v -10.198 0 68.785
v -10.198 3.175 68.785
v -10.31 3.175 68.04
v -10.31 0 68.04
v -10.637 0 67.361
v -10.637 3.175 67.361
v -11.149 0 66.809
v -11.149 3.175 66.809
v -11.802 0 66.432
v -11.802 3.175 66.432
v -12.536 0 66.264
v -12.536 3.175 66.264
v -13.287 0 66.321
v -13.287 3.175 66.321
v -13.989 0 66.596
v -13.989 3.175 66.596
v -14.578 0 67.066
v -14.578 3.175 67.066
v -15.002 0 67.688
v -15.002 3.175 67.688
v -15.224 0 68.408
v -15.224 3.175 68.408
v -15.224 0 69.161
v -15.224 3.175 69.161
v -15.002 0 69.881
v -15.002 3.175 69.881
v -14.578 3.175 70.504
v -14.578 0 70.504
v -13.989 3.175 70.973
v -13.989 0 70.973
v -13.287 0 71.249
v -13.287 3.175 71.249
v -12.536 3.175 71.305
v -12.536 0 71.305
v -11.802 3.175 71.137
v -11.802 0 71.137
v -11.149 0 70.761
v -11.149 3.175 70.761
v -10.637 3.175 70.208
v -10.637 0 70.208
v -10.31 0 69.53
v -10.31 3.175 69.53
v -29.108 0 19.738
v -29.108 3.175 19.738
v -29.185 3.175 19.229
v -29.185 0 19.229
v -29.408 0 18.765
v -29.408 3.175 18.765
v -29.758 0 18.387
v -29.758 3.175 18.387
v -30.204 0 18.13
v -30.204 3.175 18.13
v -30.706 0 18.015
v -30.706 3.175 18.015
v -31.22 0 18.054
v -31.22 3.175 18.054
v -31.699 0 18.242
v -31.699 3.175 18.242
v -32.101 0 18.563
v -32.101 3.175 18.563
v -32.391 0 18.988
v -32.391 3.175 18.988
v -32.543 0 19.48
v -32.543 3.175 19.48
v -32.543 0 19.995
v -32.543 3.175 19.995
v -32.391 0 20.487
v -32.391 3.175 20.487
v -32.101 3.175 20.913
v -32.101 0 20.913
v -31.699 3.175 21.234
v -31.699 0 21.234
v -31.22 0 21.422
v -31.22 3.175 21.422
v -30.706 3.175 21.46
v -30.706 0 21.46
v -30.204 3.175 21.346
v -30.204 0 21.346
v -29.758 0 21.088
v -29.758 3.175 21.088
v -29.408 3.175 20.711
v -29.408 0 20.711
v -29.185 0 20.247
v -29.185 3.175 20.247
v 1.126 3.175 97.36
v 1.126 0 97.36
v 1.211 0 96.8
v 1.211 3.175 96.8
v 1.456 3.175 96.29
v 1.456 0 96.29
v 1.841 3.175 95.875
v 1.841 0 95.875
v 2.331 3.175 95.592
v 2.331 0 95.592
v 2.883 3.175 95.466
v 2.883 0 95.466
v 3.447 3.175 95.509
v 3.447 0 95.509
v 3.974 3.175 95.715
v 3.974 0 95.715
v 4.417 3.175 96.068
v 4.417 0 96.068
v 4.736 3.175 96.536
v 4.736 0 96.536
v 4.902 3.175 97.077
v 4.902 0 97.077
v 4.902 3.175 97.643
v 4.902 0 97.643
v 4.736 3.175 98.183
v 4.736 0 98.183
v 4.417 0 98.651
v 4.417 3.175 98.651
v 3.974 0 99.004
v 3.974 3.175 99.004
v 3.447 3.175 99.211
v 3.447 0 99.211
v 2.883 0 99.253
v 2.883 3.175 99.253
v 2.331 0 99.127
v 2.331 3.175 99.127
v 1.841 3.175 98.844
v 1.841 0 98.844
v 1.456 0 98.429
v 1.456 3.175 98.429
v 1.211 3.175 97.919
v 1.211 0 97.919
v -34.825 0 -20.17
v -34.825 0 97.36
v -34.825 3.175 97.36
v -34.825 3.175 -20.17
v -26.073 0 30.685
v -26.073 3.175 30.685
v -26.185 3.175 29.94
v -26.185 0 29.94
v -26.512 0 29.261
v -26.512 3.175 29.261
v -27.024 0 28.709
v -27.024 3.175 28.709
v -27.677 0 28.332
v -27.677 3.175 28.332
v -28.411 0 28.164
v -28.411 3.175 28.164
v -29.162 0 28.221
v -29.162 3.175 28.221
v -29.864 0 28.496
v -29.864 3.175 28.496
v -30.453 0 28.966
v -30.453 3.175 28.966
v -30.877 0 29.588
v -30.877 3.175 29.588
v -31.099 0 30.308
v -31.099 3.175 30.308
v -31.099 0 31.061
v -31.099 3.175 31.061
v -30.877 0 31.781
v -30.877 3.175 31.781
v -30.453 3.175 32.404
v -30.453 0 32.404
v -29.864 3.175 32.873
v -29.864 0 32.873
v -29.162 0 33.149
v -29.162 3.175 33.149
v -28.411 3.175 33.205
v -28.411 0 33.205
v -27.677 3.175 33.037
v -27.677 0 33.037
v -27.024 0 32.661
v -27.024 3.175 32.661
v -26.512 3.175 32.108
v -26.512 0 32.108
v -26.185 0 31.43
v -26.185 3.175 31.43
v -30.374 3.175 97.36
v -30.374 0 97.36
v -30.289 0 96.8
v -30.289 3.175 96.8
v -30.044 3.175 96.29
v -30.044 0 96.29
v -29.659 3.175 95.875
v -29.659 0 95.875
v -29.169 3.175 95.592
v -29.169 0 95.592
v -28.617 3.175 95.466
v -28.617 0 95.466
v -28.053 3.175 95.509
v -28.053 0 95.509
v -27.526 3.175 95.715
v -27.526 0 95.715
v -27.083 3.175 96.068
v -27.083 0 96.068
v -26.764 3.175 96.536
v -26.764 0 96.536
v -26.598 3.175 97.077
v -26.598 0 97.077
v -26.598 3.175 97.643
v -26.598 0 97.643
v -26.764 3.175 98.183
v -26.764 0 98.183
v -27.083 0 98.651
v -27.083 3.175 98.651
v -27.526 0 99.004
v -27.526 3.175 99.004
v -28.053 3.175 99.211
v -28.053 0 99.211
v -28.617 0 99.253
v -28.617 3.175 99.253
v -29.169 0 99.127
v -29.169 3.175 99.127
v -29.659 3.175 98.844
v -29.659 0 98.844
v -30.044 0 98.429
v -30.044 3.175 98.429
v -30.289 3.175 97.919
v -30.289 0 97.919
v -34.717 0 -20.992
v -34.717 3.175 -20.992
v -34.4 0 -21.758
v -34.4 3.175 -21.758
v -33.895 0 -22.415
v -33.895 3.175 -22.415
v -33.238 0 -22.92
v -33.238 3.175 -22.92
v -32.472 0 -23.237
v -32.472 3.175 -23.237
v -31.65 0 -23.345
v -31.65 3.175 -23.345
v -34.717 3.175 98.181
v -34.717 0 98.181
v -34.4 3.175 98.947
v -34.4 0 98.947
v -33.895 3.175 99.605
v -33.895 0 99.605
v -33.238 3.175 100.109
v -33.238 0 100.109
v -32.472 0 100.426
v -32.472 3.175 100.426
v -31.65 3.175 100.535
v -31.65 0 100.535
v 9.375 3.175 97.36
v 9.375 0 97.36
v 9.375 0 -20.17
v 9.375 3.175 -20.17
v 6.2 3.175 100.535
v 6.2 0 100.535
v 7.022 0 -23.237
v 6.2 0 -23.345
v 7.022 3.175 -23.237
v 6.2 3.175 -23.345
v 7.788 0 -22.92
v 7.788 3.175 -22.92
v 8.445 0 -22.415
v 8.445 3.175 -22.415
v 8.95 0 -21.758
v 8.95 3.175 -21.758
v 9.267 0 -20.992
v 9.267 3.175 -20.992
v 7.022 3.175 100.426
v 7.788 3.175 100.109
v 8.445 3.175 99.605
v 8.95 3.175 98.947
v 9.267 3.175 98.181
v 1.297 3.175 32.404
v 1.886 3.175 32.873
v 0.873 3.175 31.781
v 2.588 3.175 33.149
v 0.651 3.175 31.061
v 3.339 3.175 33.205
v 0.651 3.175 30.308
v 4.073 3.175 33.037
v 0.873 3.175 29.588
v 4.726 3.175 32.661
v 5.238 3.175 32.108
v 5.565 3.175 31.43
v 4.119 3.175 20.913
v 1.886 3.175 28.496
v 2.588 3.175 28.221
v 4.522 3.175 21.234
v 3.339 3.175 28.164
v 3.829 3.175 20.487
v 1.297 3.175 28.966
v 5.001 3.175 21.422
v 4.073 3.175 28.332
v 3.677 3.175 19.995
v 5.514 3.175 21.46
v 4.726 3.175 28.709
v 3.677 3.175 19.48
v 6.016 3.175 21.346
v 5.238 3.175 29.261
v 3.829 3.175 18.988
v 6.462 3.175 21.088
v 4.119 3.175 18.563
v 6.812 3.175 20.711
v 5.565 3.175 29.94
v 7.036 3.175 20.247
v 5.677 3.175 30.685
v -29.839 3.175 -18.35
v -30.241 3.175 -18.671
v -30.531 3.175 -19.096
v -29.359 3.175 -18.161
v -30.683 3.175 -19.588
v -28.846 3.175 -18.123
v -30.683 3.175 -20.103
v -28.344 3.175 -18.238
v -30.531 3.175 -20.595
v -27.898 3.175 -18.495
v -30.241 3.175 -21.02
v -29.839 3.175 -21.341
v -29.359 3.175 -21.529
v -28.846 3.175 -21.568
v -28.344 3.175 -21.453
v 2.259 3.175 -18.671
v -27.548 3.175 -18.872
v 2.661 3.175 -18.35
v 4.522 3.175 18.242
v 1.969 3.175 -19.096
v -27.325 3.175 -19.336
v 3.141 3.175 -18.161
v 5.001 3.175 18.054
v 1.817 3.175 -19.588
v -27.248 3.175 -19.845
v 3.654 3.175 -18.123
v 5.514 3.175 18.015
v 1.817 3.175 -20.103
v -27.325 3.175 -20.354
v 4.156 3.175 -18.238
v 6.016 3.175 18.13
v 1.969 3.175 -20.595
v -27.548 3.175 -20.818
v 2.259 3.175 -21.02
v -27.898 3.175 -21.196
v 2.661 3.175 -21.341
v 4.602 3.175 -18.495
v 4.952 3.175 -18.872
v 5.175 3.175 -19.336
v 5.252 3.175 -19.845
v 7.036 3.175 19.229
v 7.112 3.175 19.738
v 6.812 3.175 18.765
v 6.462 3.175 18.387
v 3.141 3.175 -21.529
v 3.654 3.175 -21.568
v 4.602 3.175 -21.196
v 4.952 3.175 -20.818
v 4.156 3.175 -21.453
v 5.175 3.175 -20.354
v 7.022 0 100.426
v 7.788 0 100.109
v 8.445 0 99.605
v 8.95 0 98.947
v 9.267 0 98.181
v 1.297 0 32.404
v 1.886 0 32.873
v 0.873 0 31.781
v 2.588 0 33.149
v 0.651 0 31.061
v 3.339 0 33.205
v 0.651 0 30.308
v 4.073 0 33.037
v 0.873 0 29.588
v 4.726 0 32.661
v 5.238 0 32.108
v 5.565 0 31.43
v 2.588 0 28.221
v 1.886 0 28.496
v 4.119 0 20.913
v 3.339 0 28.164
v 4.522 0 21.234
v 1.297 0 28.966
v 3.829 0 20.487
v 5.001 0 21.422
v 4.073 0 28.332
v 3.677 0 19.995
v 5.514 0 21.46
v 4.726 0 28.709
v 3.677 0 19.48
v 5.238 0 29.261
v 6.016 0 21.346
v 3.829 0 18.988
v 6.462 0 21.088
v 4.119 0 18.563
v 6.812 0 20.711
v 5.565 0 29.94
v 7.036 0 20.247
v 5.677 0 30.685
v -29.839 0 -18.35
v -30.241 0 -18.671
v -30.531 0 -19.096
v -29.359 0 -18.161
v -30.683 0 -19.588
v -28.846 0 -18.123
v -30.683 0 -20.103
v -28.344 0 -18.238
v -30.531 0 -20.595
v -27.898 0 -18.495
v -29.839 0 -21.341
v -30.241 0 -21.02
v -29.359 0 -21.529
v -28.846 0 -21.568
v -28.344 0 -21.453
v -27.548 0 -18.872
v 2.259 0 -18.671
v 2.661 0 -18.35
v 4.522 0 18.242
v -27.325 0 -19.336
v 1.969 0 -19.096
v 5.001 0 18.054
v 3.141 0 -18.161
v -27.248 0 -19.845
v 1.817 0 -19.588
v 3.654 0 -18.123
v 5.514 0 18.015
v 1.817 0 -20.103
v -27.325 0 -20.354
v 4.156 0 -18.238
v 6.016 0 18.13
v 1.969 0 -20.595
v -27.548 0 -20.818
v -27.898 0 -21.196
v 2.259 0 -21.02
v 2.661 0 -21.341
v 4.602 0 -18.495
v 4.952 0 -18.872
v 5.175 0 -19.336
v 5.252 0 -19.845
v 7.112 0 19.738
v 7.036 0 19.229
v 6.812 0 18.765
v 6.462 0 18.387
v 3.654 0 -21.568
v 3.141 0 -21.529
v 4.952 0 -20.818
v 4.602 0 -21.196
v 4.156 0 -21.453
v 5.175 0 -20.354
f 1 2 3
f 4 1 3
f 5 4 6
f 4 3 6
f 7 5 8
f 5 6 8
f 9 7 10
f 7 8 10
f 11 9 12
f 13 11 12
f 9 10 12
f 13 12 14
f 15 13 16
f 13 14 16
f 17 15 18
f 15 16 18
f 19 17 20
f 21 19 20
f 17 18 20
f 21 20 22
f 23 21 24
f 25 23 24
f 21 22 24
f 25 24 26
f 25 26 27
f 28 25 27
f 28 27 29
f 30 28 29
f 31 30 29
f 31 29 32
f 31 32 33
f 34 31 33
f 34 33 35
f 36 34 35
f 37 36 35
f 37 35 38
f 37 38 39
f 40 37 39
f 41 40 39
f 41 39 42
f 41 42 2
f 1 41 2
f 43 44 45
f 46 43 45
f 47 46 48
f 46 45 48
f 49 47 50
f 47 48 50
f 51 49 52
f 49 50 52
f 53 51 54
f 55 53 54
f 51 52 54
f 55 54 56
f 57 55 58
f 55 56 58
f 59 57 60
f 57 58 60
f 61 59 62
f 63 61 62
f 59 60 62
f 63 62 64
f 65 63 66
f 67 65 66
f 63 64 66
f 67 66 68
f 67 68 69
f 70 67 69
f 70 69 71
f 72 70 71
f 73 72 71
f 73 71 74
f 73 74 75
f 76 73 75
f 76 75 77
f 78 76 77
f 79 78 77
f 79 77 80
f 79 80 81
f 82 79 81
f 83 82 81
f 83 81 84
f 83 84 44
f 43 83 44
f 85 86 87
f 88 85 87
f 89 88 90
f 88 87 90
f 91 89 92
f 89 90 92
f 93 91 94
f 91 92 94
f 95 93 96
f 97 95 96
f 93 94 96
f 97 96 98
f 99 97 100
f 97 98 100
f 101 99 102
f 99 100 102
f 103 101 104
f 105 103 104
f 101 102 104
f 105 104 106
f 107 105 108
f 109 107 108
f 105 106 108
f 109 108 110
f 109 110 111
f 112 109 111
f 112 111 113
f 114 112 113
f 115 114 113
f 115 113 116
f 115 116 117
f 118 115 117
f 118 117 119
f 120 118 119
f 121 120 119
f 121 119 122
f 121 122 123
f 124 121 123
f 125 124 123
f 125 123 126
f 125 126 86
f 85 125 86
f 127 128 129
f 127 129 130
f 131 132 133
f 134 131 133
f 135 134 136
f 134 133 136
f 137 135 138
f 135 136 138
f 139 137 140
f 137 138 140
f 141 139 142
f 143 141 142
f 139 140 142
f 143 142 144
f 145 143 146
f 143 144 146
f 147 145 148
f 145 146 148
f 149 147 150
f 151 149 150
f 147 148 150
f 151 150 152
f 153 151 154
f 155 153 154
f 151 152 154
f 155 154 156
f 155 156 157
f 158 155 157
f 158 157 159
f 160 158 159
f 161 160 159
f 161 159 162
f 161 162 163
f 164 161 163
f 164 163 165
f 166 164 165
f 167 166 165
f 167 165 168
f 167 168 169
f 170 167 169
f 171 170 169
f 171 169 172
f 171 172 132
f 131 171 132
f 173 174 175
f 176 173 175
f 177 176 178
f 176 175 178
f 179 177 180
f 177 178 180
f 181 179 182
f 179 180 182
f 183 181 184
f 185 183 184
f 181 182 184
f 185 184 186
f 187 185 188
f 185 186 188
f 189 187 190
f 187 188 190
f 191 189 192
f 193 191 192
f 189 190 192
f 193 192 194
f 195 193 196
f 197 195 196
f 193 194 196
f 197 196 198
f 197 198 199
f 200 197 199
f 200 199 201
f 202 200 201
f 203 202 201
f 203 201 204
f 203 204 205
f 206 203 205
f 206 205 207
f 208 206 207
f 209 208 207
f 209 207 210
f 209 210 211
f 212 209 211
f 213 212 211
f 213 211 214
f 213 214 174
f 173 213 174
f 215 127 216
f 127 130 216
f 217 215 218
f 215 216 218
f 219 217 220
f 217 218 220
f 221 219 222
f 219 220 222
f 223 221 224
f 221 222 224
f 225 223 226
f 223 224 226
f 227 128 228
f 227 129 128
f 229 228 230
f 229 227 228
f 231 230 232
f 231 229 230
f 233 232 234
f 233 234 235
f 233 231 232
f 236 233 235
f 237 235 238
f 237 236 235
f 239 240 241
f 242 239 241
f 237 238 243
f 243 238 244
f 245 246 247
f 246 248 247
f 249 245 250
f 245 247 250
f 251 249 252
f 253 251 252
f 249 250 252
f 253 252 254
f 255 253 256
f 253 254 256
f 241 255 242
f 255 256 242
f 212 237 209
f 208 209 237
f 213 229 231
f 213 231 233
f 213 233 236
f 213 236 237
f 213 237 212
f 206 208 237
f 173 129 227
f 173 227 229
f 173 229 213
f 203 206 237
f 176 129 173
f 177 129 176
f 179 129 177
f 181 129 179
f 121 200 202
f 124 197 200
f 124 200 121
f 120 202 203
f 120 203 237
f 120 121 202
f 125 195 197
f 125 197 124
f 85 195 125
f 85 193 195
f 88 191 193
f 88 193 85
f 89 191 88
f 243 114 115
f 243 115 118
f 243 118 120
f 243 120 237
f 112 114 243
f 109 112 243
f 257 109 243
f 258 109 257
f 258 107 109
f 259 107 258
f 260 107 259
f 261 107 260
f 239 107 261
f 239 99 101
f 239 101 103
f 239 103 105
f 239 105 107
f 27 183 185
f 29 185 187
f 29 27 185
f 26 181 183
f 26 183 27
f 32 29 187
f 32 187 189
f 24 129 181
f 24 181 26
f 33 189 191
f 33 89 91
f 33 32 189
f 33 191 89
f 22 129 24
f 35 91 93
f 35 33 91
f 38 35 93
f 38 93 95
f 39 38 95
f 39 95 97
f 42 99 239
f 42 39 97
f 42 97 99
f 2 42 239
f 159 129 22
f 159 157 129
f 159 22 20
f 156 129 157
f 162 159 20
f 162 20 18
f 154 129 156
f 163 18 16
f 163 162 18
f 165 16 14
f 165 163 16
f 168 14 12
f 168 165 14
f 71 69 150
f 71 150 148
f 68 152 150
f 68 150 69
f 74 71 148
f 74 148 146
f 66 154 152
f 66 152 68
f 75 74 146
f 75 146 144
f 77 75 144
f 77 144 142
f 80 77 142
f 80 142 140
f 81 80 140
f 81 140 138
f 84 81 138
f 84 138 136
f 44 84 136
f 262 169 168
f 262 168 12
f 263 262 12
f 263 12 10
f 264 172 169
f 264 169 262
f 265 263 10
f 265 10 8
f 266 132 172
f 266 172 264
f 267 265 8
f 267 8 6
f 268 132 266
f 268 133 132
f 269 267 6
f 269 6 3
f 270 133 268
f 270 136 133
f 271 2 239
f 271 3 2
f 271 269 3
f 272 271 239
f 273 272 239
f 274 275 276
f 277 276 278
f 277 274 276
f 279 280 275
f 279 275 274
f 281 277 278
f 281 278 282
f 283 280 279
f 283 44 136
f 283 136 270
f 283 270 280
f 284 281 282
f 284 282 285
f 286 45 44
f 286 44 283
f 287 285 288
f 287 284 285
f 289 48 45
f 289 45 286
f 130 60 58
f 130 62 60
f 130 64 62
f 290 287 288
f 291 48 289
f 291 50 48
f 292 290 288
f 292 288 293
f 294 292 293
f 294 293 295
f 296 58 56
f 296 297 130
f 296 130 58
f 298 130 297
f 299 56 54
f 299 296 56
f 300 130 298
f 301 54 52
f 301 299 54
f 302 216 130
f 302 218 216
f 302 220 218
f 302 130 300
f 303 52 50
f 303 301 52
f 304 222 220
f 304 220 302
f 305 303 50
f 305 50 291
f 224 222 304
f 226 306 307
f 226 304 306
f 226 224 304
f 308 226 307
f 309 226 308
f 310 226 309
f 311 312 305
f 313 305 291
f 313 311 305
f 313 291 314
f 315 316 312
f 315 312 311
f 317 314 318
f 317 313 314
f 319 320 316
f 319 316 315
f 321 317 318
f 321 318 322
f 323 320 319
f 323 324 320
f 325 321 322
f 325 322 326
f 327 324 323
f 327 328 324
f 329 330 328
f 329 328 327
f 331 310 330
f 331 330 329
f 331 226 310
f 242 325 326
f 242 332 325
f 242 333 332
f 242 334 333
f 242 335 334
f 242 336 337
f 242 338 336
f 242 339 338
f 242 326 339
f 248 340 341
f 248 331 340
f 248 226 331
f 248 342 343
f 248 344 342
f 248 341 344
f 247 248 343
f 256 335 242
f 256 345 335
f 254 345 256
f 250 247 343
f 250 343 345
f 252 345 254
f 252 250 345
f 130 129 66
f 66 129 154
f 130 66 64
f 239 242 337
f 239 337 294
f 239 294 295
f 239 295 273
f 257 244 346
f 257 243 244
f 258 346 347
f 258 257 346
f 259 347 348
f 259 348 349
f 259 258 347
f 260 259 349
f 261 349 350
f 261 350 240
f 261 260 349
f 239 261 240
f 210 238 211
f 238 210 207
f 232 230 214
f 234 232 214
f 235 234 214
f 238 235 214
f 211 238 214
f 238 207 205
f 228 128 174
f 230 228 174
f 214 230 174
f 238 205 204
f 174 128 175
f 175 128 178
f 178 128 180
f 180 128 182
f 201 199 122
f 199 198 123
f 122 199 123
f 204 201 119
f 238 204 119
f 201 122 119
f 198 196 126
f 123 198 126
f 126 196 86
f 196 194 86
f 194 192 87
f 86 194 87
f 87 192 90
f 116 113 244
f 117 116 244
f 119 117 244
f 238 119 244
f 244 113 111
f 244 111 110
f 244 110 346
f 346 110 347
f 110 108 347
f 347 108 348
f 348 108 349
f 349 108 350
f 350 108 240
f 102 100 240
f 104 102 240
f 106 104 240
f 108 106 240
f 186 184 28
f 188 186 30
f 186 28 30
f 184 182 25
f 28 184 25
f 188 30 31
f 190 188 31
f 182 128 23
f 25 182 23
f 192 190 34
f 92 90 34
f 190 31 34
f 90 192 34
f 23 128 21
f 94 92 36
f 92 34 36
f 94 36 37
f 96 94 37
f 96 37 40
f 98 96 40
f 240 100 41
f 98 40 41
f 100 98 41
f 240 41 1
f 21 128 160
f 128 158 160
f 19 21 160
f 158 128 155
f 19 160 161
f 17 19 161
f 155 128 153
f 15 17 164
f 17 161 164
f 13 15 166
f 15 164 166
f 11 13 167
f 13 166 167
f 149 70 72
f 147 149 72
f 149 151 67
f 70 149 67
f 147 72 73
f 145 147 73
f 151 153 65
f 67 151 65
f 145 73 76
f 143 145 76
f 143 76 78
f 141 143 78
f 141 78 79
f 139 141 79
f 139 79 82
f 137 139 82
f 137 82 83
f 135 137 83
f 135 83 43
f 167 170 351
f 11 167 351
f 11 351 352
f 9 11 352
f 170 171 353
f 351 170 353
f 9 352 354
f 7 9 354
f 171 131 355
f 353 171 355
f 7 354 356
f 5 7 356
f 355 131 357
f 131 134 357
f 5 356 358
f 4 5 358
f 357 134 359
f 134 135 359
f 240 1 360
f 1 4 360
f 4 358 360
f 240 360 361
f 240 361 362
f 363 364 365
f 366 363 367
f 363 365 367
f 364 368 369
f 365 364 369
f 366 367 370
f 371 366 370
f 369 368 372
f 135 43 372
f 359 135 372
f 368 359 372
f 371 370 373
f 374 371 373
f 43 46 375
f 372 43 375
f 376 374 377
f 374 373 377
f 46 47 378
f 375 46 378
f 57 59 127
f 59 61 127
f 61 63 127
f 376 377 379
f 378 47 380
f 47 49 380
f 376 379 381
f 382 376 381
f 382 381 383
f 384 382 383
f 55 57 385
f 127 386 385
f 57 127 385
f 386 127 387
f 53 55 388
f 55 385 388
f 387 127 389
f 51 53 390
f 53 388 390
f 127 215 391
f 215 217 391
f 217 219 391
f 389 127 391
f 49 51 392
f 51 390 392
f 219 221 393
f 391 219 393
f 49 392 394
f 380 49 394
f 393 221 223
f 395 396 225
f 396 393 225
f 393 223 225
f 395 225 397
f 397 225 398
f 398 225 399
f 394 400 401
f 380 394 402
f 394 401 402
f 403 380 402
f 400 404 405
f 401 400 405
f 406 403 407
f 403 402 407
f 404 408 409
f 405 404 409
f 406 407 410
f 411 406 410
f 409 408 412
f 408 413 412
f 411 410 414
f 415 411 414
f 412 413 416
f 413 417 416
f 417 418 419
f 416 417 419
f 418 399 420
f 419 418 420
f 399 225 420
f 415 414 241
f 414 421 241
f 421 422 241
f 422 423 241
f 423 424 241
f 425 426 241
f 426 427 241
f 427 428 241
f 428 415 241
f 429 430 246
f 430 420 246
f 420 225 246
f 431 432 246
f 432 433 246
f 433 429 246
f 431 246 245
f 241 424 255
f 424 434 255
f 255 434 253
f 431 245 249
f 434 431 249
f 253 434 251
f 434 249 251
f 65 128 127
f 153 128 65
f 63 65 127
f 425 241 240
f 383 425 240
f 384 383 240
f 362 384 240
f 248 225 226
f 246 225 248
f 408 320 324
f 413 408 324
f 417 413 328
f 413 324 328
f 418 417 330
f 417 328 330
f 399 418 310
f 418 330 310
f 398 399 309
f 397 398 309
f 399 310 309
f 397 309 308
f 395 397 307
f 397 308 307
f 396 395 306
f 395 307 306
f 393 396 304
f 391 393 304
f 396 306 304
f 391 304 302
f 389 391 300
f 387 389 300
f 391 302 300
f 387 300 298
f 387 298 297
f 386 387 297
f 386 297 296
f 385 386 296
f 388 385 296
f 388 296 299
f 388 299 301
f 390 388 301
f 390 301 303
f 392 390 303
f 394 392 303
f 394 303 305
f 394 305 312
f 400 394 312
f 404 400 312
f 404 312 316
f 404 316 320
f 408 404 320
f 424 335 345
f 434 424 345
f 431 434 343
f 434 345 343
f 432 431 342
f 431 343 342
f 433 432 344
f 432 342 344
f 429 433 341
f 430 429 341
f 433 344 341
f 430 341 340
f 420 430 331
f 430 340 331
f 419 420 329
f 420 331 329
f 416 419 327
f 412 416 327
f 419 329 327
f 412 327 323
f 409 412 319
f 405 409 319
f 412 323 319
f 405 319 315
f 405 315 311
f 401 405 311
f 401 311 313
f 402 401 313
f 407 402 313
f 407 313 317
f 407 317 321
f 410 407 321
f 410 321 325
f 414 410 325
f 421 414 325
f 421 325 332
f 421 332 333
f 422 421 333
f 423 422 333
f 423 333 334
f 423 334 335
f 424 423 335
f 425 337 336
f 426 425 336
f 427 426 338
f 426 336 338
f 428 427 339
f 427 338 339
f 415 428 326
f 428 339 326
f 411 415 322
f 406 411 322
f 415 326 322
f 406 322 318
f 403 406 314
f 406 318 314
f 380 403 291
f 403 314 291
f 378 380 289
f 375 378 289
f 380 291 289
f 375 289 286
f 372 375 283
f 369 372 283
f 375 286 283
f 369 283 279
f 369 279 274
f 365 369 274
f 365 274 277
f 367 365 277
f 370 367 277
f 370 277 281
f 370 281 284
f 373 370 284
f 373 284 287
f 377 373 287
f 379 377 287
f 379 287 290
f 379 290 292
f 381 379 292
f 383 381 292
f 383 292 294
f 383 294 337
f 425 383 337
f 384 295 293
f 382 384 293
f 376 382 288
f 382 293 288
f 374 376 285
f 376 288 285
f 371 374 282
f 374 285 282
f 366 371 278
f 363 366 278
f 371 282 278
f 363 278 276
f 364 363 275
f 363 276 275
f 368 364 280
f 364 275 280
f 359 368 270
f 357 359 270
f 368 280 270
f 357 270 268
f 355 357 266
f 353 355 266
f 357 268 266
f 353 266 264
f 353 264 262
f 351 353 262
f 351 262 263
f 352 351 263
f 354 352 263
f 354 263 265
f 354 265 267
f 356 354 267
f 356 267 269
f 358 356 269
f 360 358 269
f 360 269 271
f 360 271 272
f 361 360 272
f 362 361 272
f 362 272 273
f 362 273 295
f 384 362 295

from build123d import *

# Parameters (mm, degrees)
SKETCH1_W                  = 44.2
SKETCH1_H                  = 123.88
BOSS_EXTRUDE1_DEPTH        = 3.175
F_5_CLEARANCE_HOLE1_D      = 3.4544
F_6_CLEARANCE_HOLE1_D      = 3.7973
FILLET1_R                  = 3.175
F_8_0_199_DIAMETER_HOLE1_D = 5.0546


with BuildPart() as part:
    # Sketch1 → Boss-Extrude1 (new body)
    with BuildSketch(Plane(origin=(0, 0, 0), x_dir=(1, 0, 0), z_dir=(0, 1, 0))):
        with Locations((-12.725, -38.594662694)):
            Rectangle(SKETCH1_W, SKETCH1_H)
    extrude(amount=BOSS_EXTRUDE1_DEPTH)

    # #5 Clearance Hole1 (through all)
    with Locations(Plane(origin=(0, 0, 0), x_dir=(-1, 0, 0), z_dir=(0, -1, 0))):
        with Locations((28.975, 19.845337306), (-3.525, 19.845337306), (-5.3852, -19.737862694), (30.8352, -19.737862694)):
            Hole(F_5_CLEARANCE_HOLE1_D / 2)

    # #6 Clearance Hole1 (through all)
    with Locations(Plane(origin=(0, 3.175, 0), x_dir=(1, 0, 0), z_dir=(0, 1, 0))):
        with Locations((3.025, -97.359662694), (-28.475, -97.359662694)):
            Hole(F_6_CLEARANCE_HOLE1_D / 2)

    # Fillet1
    fillet1_edges = [part.edges().sort_by_distance(p)[0] for p in [
        (-34.825, 1.5875, -23.345337306),
        (9.375, 1.5875, -23.345337306),
        (9.375, 1.5875, 100.534662694),
        (-34.825, 1.5875, 100.534662694),
    ]]
    fillet(fillet1_edges, radius=FILLET1_R)

    # #8 (0.199) Diameter Hole1 (through all)
    with Locations(Plane(origin=(0, 0, 0), x_dir=(-1, 0, 0), z_dir=(0, -1, 0))):
        with Locations((-3.15, -30.684662694), (28.6, -30.684662694), (12.725, -68.784662694)):
            Hole(F_8_0_199_DIAMETER_HOLE1_D / 2)


solid = part.part
